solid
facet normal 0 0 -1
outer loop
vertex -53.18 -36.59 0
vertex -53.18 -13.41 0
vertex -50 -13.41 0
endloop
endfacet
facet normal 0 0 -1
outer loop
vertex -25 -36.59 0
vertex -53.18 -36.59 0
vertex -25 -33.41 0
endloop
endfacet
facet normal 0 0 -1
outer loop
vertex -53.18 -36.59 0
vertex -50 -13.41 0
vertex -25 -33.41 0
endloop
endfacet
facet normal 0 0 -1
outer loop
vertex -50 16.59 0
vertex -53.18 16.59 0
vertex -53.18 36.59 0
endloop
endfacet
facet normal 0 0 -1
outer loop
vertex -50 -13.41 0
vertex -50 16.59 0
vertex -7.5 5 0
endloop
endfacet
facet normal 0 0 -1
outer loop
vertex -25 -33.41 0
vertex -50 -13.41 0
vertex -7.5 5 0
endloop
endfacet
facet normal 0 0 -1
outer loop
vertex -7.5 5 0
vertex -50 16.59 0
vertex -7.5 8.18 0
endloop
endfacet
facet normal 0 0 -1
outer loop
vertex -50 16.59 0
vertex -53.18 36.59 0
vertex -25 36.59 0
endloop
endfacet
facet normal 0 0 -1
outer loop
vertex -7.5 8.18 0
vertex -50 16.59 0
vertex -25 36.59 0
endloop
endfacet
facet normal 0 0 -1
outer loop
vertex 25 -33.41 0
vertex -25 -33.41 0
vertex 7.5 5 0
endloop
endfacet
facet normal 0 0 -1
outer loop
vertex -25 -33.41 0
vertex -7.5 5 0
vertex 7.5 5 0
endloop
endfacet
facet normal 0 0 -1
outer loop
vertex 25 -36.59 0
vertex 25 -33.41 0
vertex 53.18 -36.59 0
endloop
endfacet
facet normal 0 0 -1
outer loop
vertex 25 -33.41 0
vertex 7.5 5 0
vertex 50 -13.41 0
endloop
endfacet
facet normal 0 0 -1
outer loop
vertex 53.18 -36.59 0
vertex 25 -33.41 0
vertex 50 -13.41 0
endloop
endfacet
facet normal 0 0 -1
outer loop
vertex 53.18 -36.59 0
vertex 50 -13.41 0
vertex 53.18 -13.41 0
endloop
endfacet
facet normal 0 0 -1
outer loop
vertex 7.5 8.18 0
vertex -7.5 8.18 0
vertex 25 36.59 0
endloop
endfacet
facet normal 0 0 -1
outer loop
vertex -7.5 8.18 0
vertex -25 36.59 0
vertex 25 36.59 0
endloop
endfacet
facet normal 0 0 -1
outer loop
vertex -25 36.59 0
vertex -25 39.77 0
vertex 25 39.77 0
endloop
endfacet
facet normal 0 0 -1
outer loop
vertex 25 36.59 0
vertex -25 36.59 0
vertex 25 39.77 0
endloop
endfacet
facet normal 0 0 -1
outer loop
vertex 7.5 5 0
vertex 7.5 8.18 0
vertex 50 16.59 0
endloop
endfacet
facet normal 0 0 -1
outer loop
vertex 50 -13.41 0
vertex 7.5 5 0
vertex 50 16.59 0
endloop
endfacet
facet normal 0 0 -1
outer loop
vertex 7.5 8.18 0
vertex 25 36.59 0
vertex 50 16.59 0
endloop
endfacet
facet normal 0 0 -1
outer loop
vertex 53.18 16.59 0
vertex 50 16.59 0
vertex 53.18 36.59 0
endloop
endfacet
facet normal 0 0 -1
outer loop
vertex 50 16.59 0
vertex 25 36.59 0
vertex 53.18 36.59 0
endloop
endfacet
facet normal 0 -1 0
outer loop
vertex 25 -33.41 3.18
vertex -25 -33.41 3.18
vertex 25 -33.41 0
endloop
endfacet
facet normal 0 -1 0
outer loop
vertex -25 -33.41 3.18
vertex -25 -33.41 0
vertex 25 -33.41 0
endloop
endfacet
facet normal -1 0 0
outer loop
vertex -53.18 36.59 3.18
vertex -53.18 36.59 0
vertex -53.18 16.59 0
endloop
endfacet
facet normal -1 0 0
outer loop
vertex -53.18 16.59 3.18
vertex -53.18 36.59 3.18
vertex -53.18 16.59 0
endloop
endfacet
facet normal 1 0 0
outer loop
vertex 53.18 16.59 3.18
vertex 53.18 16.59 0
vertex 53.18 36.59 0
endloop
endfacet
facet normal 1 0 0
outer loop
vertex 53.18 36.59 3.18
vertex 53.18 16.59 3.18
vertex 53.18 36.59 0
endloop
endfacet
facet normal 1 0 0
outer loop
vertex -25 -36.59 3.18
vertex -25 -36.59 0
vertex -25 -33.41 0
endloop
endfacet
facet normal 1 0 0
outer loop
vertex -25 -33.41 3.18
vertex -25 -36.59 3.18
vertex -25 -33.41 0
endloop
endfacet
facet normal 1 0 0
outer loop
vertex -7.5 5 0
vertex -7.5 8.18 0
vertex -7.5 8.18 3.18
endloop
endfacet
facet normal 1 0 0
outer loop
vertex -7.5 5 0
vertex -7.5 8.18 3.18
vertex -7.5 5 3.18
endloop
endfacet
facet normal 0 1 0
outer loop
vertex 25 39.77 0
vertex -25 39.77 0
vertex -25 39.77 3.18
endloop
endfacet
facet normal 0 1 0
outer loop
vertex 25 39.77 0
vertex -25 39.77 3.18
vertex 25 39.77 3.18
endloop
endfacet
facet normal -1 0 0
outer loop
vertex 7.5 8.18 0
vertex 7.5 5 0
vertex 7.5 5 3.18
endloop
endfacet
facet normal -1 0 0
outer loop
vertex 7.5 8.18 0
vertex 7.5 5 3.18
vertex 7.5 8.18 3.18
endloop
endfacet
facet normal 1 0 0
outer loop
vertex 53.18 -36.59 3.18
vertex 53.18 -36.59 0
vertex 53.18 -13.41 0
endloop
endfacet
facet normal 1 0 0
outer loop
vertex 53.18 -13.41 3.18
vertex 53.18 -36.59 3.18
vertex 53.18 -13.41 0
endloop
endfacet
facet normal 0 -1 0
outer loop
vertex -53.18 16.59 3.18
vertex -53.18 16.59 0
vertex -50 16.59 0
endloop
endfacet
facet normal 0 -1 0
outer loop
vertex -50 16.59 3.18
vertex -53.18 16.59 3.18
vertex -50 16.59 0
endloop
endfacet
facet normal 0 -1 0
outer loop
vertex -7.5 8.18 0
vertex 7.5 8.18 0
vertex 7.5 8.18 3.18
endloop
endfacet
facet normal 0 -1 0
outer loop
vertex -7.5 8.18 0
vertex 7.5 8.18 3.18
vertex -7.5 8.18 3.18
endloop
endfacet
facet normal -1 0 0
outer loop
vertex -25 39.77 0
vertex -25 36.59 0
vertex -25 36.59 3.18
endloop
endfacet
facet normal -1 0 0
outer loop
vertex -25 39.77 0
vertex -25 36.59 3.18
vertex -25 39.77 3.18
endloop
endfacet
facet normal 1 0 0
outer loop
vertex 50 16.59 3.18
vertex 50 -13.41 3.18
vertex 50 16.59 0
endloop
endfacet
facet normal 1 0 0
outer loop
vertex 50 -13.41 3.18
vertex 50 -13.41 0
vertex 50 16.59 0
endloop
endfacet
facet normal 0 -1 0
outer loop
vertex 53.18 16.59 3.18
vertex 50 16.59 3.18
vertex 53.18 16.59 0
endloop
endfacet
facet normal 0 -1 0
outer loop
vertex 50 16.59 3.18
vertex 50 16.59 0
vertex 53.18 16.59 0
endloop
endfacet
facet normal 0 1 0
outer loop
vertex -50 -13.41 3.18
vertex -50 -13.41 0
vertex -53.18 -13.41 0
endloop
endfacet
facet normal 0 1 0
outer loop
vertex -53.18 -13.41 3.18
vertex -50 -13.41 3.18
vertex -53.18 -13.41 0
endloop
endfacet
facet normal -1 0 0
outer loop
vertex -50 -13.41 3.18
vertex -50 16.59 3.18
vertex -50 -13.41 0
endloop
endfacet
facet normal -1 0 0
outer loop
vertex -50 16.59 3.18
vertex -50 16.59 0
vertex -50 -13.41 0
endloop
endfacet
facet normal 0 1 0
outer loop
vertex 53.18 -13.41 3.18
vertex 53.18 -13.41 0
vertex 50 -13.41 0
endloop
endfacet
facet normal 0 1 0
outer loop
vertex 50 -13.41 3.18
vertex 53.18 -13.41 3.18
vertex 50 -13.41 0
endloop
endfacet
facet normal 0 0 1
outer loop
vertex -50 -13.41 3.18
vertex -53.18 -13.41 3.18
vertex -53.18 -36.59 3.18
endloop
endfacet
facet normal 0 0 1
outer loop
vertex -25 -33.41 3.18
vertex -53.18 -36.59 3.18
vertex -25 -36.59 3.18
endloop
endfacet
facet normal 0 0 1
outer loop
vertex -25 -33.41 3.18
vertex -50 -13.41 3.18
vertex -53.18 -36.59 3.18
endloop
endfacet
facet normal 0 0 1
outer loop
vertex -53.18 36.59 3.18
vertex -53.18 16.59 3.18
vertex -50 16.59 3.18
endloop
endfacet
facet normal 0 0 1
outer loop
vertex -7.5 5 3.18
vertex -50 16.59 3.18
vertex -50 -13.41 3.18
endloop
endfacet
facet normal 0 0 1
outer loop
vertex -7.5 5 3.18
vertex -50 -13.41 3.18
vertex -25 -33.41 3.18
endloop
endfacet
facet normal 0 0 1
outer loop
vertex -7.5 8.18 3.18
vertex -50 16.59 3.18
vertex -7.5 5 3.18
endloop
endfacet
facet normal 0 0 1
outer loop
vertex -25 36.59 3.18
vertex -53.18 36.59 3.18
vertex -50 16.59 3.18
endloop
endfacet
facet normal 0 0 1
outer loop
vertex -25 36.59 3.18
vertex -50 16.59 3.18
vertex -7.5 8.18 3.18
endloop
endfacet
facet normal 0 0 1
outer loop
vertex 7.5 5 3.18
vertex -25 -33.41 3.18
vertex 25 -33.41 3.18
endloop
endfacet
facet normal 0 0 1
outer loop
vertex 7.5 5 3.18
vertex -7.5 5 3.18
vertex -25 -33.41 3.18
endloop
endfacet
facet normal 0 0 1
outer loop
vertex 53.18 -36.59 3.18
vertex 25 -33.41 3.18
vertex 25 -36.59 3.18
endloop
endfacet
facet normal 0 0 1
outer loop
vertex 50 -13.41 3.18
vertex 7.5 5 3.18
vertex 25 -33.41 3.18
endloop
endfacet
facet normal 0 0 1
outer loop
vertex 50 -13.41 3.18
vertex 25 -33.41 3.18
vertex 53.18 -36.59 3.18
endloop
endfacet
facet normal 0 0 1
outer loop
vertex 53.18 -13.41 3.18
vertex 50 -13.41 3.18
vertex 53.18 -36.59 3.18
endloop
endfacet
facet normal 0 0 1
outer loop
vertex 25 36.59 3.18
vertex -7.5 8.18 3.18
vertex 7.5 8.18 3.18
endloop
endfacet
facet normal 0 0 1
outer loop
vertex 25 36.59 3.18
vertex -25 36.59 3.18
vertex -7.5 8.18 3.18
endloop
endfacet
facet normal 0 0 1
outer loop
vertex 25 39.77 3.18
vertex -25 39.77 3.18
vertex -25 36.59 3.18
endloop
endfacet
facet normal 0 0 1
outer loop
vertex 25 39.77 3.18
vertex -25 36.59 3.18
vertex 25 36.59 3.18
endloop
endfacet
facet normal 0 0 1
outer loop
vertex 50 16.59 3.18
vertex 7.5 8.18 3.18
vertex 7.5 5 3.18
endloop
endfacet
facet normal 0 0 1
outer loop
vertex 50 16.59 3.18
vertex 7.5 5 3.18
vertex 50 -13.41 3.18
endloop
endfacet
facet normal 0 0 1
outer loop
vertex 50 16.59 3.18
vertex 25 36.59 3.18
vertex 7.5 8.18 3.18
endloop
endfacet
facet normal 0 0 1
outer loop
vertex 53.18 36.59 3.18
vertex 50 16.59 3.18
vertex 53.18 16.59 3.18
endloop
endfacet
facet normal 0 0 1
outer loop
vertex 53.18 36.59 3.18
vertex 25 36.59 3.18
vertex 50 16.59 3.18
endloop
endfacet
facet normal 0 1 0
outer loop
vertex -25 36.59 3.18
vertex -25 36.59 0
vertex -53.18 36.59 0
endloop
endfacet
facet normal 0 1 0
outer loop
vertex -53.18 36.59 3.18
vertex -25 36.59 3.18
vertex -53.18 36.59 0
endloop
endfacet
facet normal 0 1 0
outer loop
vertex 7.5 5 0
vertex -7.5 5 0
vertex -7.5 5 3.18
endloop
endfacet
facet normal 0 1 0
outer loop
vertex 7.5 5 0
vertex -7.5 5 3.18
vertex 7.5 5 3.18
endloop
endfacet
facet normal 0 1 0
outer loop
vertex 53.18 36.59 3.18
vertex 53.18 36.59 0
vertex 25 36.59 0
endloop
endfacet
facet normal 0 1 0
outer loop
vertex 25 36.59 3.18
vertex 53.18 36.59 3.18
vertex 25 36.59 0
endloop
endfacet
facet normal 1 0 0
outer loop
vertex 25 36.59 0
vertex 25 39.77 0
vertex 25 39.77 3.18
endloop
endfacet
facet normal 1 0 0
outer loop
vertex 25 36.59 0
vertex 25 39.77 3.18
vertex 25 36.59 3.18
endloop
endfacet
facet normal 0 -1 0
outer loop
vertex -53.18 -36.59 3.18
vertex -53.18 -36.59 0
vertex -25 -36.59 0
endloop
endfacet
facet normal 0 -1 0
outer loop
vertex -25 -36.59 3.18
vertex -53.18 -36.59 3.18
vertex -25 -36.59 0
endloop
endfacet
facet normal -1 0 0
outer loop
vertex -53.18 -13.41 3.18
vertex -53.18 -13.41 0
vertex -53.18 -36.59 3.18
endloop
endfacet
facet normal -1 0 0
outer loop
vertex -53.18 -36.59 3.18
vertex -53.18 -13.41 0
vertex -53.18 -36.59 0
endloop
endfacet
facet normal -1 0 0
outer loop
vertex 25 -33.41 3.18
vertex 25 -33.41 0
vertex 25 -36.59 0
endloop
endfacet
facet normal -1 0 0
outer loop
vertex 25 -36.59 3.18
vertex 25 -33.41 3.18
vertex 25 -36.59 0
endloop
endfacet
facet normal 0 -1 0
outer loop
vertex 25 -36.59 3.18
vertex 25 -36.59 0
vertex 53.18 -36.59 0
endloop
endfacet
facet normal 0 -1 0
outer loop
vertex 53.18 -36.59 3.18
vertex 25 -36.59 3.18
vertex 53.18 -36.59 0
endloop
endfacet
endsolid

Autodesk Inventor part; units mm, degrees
ref_plane "YZ Plane" through (0, 0, 0) normal (1, 0, 0) x (0, 1, 0)
ref_plane "XZ Plane" through (0, 0, 0) normal (0, 1, 0) x (-1, 0, 0)
ref_plane "XY Plane" through (0, 0, 0) normal (0, 0, 1) x (1, 0, 0)
sketch "Boceto1" plane through (0, 0, 0) normal (0, 0, 1) x (1, 0, 0)
  line L0 (-53.18, -36.59) -> (53.18, -36.59)
  line L1 (53.18, -36.59) -> (53.18, 36.59)
  line L2 (53.18, 36.59) -> (-53.18, 36.59)
  line L3 (-53.18, 36.59) -> (-53.18, -36.59)
  line L4 (-53.18, -36.59) -> (53.18, 36.59) construction
  line L5 (53.18, -36.59) -> (-53.18, 36.59) construction
  line L6 (-19.9778, -36.59) -> (30.0222, -36.59)
  line L7 (-25, 39.77) -> (25, 39.77)
  line L8 (25, 39.77) -> (25, 36.59)
  line L9 (25, 36.59) -> (-25, 36.59)
  line L10 (-25, 36.59) -> (-25, 39.77)
  line L11 (-53.18, 16.59) -> (-50, 16.59)
  line L12 (-50, 16.59) -> (-50, -13.41)
  line L13 (-50, -13.41) -> (-53.18, -13.41)
  line L14 (-53.18, -13.41) -> (-53.18, 16.59)
  line L15 (50, 16.59) -> (53.18, 16.59)
  line L16 (53.18, 16.59) -> (53.18, -13.41)
  line L17 (53.18, -13.41) -> (50, -13.41)
  line L18 (50, -13.41) -> (50, 16.59)
  line L19 (-25, -33.41) -> (25, -33.41)
  line L20 (25, -33.41) -> (25, -36.59)
  line L21 (25, -36.59) -> (-25, -36.59)
  line L22 (-25, -36.59) -> (-25, -33.41)
  line L23 (-7.5, 5) -> (7.5, 5)
  line L24 (7.5, 5) -> (7.5, 8.18)
  line L25 (7.5, 8.18) -> (-7.5, 8.18)
  line L26 (-7.5, 8.18) -> (-7.5, 5)
  line L27 (-7.5, 5) -> (7.5, 8.18) construction
  line L28 (7.5, 5) -> (-7.5, 8.18) construction
  point P0 (0, 0)
  point P1 (0, 6.59)
  dimension "d0" = 106.36
  dimension "d3" = 73.18
  dimension "d4" = 3.18
  dimension "d5" = 50
  dimension "d6" = 25
  dimension "d8" = 30
  dimension "d9" = 30
  dimension "d10" = 3.18
  dimension "d11" = 20
  dimension "d12" = 20
  dimension "d13" = 50
  dimension "d14" = 25
  dimension "d17" = 15
  dimension "d18" = 3.18
  dimension "d19" = 40
  dimension "d20" = 7.5
extrude "Extrusión1" add sketch "Boceto1" along normal blind 3.18 contours L3 L13 L12 L11 L2 L1 L15 L18 L17 L0 L20 L19 L22 | L10 L7 L8 L2
properties part number "BASE_TAPAFIJA"
